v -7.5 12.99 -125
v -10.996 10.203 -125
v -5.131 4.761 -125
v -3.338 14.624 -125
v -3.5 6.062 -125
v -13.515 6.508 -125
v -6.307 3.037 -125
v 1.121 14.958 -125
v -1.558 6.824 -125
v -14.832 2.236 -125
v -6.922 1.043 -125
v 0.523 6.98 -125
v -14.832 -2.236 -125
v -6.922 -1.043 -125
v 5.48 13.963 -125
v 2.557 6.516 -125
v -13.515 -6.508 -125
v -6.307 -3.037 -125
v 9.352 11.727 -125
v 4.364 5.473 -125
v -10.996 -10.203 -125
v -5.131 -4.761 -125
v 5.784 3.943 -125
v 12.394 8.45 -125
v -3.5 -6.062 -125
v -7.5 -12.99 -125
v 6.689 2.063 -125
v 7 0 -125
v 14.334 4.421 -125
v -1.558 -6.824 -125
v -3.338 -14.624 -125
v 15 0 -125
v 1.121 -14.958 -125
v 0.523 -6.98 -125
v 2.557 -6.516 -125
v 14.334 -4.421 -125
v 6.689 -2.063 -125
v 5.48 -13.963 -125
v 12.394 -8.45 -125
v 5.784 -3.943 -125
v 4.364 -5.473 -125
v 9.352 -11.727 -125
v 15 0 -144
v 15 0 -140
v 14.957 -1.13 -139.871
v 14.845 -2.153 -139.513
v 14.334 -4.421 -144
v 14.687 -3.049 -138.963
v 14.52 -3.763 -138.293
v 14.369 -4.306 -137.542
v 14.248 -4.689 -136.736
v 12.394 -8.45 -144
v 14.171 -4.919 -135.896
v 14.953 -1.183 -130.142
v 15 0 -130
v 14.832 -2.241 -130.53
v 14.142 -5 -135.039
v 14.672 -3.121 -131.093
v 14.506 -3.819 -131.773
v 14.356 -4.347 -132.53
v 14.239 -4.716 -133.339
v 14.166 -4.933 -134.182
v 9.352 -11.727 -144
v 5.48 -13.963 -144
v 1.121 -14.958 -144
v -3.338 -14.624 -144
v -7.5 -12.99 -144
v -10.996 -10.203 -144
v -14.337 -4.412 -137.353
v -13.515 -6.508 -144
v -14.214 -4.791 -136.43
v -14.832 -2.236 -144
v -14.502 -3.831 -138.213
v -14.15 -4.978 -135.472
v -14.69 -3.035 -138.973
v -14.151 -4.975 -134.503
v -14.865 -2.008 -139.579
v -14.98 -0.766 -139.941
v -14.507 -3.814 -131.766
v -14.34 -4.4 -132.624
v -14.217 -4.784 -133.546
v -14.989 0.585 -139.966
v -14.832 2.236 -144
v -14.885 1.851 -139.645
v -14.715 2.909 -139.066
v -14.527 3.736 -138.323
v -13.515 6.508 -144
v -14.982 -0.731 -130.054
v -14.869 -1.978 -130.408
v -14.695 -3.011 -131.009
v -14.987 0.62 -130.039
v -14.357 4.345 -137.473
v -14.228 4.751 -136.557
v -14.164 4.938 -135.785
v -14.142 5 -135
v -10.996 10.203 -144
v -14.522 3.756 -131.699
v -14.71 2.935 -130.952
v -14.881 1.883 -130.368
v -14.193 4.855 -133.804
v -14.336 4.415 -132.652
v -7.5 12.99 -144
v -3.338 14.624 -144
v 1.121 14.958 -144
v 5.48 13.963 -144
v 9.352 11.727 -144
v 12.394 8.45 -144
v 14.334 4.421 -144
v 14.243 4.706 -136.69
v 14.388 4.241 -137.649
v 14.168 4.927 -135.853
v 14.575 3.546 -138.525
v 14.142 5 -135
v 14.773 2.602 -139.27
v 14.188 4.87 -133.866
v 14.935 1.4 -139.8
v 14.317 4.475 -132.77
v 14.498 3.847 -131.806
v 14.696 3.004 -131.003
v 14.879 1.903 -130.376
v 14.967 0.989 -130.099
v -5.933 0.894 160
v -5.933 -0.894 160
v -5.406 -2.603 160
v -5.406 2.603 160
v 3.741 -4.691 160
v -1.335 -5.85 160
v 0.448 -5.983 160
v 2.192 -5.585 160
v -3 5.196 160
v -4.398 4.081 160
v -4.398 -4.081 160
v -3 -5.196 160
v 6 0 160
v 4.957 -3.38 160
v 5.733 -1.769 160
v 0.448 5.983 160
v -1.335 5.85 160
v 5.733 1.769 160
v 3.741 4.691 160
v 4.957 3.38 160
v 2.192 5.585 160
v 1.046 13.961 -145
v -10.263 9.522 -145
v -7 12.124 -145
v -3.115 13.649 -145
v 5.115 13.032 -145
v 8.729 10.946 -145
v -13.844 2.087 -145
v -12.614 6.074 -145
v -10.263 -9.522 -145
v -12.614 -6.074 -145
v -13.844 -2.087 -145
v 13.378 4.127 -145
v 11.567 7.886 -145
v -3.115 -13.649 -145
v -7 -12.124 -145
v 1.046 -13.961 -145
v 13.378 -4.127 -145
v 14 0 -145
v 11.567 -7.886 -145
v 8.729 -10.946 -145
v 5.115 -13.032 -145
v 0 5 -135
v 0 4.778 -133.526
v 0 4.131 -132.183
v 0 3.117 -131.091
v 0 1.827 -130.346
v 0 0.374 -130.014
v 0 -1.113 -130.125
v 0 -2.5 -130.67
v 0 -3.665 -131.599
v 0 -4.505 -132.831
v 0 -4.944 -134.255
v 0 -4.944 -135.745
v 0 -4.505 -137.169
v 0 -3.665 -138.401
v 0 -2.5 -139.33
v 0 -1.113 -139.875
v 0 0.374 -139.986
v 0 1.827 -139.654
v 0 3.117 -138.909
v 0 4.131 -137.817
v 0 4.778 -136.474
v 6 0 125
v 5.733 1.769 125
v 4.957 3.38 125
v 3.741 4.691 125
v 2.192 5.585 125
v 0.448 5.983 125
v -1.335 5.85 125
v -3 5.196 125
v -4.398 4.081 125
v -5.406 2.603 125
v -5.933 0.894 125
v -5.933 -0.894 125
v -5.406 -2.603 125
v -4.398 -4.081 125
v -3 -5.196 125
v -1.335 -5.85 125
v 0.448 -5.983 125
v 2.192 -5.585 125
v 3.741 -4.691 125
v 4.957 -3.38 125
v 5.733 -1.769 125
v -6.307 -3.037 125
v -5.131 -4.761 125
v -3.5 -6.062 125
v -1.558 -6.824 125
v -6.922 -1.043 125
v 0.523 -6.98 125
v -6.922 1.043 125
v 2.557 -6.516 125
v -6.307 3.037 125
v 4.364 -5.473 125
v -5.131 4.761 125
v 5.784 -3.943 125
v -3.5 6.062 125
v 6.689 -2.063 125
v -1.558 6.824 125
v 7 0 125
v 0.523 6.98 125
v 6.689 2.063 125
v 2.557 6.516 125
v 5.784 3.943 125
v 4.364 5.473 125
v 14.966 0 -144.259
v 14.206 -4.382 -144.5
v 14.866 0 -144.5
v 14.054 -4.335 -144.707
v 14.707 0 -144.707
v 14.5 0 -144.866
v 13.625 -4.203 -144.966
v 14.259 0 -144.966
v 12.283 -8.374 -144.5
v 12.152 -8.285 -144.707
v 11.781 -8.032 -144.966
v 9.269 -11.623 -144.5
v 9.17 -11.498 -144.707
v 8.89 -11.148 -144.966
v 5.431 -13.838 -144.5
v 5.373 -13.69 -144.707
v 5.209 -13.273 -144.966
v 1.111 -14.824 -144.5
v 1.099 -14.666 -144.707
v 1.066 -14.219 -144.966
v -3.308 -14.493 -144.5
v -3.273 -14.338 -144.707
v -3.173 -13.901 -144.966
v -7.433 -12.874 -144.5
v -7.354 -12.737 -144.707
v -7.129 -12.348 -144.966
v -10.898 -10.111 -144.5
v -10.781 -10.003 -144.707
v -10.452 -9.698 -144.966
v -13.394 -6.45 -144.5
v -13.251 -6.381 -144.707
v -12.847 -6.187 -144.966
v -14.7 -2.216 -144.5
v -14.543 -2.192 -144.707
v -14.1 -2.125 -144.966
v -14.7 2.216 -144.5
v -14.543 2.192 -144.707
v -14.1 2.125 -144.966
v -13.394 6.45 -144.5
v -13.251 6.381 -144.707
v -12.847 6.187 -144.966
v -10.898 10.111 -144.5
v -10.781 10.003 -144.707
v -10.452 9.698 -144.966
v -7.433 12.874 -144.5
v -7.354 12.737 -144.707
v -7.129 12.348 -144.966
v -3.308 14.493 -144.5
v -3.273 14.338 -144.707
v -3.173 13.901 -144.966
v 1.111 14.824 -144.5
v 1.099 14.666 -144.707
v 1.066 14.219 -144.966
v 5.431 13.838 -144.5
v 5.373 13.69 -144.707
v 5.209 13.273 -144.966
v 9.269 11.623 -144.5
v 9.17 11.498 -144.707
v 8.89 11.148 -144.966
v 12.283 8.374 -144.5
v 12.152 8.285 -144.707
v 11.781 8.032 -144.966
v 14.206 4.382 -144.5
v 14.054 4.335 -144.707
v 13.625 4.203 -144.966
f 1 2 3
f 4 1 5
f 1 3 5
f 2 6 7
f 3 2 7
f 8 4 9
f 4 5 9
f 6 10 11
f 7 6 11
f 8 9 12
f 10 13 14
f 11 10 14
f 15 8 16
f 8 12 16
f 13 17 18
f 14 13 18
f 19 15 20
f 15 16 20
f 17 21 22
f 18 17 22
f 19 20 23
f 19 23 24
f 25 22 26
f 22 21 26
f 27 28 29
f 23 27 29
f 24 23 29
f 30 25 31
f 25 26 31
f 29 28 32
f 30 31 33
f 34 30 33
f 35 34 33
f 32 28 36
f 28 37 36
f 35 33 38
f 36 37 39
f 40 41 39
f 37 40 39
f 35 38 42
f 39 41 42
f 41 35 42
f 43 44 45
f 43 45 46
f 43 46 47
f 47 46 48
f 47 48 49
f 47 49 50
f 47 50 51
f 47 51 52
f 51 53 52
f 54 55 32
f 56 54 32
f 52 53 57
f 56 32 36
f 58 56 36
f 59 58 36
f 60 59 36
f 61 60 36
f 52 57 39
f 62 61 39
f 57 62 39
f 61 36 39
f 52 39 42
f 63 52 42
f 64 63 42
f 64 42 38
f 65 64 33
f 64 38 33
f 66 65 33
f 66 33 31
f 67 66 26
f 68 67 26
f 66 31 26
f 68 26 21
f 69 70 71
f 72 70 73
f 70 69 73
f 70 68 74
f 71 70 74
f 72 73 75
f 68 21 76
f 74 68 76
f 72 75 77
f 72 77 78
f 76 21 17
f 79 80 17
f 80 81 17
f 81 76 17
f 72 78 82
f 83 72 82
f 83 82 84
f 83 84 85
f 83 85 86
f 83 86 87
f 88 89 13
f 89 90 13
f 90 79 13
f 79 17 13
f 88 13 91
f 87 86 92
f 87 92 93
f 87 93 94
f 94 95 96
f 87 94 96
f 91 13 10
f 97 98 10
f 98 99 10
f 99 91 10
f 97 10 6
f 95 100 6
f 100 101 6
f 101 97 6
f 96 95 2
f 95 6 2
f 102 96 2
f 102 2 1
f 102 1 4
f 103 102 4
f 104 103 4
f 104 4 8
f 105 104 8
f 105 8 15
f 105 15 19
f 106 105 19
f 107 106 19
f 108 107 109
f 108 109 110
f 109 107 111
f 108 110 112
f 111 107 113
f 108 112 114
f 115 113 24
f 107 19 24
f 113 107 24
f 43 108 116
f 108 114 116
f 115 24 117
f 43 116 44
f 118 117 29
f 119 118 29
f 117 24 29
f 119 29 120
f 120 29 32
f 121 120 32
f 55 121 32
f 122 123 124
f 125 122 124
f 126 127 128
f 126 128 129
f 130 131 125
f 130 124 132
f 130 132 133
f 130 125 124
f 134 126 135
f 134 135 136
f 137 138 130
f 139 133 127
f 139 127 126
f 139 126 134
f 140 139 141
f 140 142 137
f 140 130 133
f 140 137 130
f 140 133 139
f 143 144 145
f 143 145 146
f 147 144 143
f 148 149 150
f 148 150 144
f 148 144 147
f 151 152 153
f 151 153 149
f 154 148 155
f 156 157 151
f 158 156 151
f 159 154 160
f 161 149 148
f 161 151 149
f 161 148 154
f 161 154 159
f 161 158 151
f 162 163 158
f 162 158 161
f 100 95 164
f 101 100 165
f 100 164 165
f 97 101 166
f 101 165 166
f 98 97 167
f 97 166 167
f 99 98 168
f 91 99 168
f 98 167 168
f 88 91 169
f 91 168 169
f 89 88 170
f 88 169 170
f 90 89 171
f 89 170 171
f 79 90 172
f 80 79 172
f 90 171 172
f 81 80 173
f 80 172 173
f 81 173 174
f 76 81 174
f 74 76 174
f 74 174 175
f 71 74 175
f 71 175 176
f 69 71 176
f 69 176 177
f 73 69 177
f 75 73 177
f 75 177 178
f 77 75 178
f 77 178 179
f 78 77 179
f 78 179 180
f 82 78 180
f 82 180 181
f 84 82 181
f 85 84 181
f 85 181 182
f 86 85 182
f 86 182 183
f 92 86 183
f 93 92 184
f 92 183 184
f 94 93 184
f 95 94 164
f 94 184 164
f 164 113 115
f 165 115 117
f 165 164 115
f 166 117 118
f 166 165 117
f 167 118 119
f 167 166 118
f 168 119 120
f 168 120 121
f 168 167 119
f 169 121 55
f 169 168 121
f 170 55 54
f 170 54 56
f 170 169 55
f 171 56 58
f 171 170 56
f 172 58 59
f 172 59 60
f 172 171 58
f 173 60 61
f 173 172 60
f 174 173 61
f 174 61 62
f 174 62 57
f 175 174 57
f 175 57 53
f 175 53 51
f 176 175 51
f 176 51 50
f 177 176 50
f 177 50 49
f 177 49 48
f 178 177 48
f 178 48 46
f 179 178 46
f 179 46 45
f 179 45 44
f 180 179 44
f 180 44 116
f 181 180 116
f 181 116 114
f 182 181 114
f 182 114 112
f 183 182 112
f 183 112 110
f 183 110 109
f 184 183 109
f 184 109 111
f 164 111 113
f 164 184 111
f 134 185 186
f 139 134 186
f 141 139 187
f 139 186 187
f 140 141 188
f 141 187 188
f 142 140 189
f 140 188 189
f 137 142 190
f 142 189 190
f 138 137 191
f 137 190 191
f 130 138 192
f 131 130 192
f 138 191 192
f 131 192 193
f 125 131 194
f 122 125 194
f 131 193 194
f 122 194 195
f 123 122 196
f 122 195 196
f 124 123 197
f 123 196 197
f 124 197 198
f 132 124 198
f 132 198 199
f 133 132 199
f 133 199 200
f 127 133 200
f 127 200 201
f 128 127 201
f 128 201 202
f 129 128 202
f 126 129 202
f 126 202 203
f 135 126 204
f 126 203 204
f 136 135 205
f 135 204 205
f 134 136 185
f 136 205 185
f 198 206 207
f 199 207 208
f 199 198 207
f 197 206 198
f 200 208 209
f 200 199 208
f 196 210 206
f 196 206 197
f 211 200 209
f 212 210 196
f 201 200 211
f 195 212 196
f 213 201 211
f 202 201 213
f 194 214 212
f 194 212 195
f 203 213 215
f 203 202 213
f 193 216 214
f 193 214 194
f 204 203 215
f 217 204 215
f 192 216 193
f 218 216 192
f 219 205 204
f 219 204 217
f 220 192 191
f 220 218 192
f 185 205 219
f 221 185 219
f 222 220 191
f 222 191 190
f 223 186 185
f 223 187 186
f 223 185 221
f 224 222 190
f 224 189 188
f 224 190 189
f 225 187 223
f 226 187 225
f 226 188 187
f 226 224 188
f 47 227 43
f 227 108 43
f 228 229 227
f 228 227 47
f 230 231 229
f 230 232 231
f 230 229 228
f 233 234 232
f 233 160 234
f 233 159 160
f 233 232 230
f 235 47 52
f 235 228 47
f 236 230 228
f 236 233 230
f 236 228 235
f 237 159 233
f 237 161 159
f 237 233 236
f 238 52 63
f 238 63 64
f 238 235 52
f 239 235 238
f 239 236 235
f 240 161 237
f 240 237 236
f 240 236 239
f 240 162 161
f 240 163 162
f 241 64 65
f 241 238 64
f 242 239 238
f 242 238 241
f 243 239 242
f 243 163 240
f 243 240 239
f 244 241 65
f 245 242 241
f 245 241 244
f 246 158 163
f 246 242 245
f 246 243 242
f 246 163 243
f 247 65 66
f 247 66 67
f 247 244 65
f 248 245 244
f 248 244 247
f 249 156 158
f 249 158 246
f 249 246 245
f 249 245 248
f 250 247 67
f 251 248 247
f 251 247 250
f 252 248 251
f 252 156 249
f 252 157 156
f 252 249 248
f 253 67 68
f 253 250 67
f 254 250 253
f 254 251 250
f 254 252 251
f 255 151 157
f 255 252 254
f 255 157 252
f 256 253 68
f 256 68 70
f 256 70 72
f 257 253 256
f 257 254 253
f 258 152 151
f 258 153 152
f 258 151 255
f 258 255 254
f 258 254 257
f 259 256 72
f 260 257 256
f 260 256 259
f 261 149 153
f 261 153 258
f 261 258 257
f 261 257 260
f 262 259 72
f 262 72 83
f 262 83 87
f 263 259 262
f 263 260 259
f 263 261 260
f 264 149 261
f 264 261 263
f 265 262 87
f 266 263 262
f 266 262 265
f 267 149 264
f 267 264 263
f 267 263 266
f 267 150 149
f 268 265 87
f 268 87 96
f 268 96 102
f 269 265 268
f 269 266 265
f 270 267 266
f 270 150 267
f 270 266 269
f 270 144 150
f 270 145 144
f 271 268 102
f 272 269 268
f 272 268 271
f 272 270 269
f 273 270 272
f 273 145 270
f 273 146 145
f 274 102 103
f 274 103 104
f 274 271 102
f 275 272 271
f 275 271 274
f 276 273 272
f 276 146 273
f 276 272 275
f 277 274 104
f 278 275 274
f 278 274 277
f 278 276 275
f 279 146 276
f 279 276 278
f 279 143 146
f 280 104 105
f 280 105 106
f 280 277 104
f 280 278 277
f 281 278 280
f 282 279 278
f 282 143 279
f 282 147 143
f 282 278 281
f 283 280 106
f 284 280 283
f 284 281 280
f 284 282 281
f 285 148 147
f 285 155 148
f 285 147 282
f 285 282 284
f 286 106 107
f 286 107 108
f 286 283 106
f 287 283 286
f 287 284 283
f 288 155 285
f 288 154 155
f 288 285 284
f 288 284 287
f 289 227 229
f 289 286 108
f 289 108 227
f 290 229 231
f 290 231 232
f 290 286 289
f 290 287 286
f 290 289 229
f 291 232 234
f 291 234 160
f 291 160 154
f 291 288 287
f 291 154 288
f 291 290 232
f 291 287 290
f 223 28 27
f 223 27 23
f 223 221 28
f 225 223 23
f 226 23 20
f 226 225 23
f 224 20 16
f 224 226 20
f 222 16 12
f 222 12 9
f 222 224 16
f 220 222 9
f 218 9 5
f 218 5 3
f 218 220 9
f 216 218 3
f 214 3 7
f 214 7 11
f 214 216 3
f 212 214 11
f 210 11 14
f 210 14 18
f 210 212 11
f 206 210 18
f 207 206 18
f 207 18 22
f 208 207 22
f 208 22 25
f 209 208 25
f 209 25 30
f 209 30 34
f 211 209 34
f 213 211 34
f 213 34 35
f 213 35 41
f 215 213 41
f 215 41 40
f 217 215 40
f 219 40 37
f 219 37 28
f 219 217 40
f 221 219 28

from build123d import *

# Parameters (mm, degrees)
F0_R          = 7
F1_DEPTH      = 125
F2_R          = 6
F3_DEPTH      = 35
F4_R          = 15
F5_DEPTH      = 20
F6_R          = 5
F7_DEPTH      = 15.001
F7_DEPTH_BACK = 25
F8_R          = 1


with BuildPart() as f1:
    # F0 (on Top) → F1 (new body, symmetric)
    with BuildSketch(Plane.XY):
        Circle(F0_R)
    extrude(amount=F1_DEPTH, both=True)

    # F2 (on face) → F3 (join)
    with BuildSketch(Plane.XY.offset(125)):
        Circle(F2_R)
    extrude(amount=F3_DEPTH)

    # F4 (on face) → F5 (join)
    with BuildSketch(Plane(origin=(0, 0, -125), x_dir=(1, 0, 0), z_dir=(0, 0, -1))):
        Circle(F4_R)
    extrude(amount=F5_DEPTH)

    # F6 (on Right) → F7 (cut, two sides)
    with BuildSketch(Plane.YZ) as f7_sk:
        with Locations((0, -135)):
            Circle(F6_R)
    extrude(amount=-F7_DEPTH, mode=Mode.SUBTRACT)
    extrude(f7_sk.sketch, amount=F7_DEPTH_BACK, mode=Mode.SUBTRACT)

    # F8
    f8_edges = [f1.edges().sort_by_distance(p)[0] for p in [
        (-15, 0, -145),
    ]]
    fillet(f8_edges, radius=F8_R)


solid = f1.part
